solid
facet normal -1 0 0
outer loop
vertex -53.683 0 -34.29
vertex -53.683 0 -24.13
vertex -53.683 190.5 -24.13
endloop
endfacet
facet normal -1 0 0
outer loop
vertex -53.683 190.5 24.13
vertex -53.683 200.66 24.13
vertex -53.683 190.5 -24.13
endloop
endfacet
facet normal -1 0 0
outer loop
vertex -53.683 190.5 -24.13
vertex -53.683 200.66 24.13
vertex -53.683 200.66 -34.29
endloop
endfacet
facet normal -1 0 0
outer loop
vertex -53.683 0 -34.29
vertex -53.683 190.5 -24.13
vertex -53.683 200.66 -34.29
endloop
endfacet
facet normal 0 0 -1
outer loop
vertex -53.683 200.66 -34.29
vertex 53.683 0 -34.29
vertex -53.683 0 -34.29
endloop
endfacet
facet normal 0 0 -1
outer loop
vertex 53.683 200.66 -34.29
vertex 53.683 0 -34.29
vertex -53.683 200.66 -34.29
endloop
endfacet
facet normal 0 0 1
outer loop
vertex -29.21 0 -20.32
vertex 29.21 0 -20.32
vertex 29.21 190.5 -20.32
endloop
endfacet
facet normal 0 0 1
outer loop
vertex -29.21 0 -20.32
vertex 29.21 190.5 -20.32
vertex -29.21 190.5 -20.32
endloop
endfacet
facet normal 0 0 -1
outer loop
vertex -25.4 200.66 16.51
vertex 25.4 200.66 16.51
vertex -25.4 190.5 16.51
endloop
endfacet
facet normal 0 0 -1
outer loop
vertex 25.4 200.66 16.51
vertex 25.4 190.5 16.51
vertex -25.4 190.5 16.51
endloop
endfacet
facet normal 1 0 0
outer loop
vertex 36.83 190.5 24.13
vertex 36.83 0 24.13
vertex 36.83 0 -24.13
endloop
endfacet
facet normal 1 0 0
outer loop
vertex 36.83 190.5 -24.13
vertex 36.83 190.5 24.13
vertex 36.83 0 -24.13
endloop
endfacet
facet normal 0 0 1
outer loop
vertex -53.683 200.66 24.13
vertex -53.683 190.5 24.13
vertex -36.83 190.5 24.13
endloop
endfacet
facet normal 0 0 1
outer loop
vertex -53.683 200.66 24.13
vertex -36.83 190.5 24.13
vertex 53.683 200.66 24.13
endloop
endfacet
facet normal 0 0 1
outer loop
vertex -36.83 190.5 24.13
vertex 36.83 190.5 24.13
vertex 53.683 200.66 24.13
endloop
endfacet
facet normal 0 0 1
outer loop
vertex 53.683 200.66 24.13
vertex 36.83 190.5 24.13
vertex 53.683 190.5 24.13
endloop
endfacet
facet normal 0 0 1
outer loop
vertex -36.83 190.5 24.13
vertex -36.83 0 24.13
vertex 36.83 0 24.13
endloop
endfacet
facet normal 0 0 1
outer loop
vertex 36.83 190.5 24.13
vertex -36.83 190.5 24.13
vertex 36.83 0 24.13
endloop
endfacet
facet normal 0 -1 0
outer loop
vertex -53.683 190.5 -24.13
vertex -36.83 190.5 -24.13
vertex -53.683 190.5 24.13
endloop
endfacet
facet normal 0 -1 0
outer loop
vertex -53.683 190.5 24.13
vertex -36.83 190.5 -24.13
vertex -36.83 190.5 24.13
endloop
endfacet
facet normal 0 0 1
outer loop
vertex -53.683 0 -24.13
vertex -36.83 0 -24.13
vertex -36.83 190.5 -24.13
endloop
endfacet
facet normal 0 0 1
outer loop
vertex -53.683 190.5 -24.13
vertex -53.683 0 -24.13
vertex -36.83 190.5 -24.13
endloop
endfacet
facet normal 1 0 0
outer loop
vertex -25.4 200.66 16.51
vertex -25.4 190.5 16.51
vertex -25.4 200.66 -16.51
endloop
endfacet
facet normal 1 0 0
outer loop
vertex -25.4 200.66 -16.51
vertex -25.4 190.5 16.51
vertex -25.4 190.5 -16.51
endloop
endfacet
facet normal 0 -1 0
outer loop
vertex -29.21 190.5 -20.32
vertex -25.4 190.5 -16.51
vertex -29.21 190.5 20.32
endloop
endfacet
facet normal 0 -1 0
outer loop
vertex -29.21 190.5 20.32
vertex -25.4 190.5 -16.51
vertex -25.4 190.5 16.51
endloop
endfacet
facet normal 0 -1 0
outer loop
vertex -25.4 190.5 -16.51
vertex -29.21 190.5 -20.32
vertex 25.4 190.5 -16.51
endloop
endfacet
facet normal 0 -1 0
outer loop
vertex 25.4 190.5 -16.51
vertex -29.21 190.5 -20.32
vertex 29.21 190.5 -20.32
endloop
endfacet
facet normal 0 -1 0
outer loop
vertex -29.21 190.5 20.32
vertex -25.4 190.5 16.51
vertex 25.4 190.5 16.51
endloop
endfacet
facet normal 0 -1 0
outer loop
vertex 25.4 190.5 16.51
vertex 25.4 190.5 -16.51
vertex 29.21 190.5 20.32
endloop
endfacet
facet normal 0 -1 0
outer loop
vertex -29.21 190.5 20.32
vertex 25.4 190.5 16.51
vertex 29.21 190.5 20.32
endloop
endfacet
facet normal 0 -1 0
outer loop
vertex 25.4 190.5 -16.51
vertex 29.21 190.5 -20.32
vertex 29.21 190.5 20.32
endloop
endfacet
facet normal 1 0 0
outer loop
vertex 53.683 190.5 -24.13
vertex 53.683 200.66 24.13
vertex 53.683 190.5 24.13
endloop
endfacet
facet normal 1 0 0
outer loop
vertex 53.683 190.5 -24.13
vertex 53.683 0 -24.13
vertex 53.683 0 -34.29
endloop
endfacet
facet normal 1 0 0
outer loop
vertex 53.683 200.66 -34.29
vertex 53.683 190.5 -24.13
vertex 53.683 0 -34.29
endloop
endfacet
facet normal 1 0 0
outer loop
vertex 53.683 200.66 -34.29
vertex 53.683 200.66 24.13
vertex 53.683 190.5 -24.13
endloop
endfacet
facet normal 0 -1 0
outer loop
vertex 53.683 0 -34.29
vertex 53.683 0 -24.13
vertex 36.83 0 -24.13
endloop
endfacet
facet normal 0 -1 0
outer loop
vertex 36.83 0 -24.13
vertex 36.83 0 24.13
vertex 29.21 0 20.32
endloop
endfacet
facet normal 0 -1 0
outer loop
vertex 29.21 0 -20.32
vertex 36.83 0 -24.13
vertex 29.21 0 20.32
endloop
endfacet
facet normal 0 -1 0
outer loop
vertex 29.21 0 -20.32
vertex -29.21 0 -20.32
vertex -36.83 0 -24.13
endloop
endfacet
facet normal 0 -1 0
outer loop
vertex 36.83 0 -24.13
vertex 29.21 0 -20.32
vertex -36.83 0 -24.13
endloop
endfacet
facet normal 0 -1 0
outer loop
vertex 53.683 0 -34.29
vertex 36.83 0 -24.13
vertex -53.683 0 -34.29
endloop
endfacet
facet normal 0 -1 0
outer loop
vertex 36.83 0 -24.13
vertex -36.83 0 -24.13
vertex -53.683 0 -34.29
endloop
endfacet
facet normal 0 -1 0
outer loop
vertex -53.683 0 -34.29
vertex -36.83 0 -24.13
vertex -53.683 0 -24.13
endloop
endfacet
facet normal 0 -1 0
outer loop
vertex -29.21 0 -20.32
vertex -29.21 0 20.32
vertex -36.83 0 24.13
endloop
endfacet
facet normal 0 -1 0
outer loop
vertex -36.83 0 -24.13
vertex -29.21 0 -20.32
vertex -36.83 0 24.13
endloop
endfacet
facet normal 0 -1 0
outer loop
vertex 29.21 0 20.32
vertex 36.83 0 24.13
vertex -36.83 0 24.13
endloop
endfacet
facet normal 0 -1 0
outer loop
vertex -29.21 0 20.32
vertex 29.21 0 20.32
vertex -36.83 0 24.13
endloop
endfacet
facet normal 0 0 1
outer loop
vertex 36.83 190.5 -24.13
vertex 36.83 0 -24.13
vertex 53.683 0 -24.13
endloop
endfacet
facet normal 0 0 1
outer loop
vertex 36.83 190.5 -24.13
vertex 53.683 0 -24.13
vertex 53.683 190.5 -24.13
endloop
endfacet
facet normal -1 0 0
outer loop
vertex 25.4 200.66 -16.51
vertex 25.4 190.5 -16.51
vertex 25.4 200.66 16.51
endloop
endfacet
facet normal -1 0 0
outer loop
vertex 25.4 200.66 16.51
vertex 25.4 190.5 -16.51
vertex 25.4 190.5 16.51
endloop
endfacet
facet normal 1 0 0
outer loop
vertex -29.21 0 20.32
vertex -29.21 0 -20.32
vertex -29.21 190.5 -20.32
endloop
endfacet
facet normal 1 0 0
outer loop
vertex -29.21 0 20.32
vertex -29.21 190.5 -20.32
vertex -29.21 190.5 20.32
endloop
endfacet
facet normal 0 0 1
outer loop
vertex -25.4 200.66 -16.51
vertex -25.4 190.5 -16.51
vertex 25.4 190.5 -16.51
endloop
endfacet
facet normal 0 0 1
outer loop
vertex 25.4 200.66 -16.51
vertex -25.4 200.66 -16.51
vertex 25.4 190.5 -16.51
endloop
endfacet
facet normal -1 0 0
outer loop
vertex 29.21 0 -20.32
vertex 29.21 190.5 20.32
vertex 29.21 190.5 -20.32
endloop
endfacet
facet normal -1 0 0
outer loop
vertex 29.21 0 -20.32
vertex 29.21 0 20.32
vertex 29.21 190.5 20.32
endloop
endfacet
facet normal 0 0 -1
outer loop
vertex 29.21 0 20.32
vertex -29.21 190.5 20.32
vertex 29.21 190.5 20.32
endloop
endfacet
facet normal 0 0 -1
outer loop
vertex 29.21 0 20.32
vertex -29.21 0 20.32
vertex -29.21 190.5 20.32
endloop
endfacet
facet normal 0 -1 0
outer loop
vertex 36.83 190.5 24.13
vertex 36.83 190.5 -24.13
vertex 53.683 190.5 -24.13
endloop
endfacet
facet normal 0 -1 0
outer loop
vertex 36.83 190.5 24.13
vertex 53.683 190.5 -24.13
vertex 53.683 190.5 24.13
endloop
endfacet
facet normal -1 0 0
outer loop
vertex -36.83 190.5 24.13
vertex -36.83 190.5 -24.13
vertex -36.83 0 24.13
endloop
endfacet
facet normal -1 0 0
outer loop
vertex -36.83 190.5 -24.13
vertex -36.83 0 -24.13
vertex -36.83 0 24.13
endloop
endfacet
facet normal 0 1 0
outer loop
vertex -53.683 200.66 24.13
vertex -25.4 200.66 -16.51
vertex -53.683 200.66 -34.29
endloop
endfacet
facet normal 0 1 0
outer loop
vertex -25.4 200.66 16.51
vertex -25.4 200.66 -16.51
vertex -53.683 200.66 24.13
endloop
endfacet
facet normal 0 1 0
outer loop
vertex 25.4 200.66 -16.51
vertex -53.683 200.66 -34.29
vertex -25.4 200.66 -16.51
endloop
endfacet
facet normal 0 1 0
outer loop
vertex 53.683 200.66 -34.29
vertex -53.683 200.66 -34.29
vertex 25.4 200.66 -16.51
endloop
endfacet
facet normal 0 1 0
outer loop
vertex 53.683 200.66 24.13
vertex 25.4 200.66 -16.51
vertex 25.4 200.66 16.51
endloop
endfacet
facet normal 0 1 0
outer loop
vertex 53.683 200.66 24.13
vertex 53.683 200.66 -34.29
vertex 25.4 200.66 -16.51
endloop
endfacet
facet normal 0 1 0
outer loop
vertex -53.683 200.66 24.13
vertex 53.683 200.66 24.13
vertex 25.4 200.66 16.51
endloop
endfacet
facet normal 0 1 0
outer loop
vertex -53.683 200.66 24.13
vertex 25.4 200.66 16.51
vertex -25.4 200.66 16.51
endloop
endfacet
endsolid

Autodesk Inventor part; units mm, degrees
ref_plane "YZ Plane" through (0, 0, 0) normal (1, 0, 0) x (0, 1, 0)
ref_plane "XZ Plane" through (0, 0, 0) normal (0, 1, 0) x (-1, 0, 0)
ref_plane "XY Plane" through (0, 0, 0) normal (0, 0, 1) x (1, 0, 0)
sketch "Sketch1" plane through (0, 0, 0) normal (0, 1, 0) x (-1, 0, 0)
  line L0 (36.83, 24.13) -> (-36.83, 24.13)
  line L1 (-36.83, 24.13) -> (-36.83, -24.13)
  line L2 (-36.83, -24.13) -> (36.83, -24.13)
  line L3 (36.83, -24.13) -> (36.83, 24.13)
  line L4 (36.83, 24.13) -> (-36.83, -24.13) construction
  line L5 (-36.83, 24.13) -> (36.83, -24.13) construction
  line L6 (29.21, 20.32) -> (-29.21, 20.32)
  line L7 (-29.21, 20.32) -> (-29.21, -20.32)
  line L8 (-29.21, -20.32) -> (29.21, -20.32)
  line L9 (29.21, -20.32) -> (29.21, 20.32)
  line L10 (29.21, 20.32) -> (-29.21, -20.32) construction
  line L11 (-29.21, 20.32) -> (29.21, -20.32) construction
  point P0 (0, 0)
  dimension "d0" = 73.66
  dimension "d1" = 48.26
  dimension "d2" = 58.42
  dimension "d3" = 40.64
extrude "Extrusion1" add sketch "Sketch1" along normal blind 190.5
sketch "Sketch2" plane through (36.83, 0, 24.13) normal (1, 0, 0) x (0, 0, -1)
  line L0 (0, 0) -> (-10.16, 0)
  line L1 (48.26, 0) -> (48.26, 190.5) projected
  line L2 (48.26, 0) -> (58.42, 0)
  line L3 (-10.16, 0) -> (58.42, 0)
  line L4 (58.42, 0) -> (58.42, 190.5)
  line L5 (58.42, 190.5) -> (-10.16, 190.5)
  line L6 (-10.16, 190.5) -> (-10.16, 0)
  line L7 (-10.16, 190.5) -> (58.42, 190.5)
  line L8 (58.42, 190.5) -> (58.42, 200.66)
  line L9 (58.42, 200.66) -> (-10.16, 200.66)
  line L10 (-10.16, 200.66) -> (-10.16, 190.5)
  line L11 (0, 190.5) -> (48.26, 190.5) projected
  line L12 (-10.16, 0) -> (0, 0)
  line L13 (0, 0) -> (0, 190.5)
  line L14 (0, 190.5) -> (-10.16, 190.5)
  line L15 (-10.16, 190.5) -> (-10.16, 0)
  line L16 (0, 190.5) -> (58.42, 190.5)
  line L17 (58.42, 190.5) -> (58.42, 200.66)
  line L18 (58.42, 200.66) -> (0, 200.66)
  line L19 (0, 200.66) -> (0, 190.5)
  point P0 (24.13, 0)
  dimension "d6" = 10.16
  dimension "d7" = 10.16
  dimension "d8" = 10.16
extrude "Extrusion2" add sketch "Sketch2" against normal blind 90.5129 contours L1 L5 L4 L2 | L19 L9 L8 L5
extrude "Extrusion3" add sketch "Sketch2" along normal blind 16.8529 contours L1 L5 L4 L2 | L19 L9 L8 L5
sketch "Sketch3" plane through (-29.21, 190.5, 20.32) normal (0, -1, 0) x (1, 0, 0)
  line L0 (58.42, 0) -> (0, 0) projected
  line L1 (0, -40.64) -> (58.42, -40.64) projected
  line L2 (58.42, 0) -> (0, 0)
  line L3 (0, 0) -> (0, -40.64)
  line L4 (0, -40.64) -> (58.42, -40.64)
  line L5 (58.42, -40.64) -> (58.42, 0)
  line L6 (54.61, -3.81) -> (3.81, -3.81)
  line L7 (3.81, -3.81) -> (3.81, -36.83)
  line L8 (3.81, -36.83) -> (54.61, -36.83)
  line L9 (54.61, -36.83) -> (54.61, -3.81)
  line L10 (54.61, -3.81) -> (3.81, -36.83) construction
  line L11 (3.81, -3.81) -> (54.61, -36.83) construction
  point P0 (29.21, -20.32)
  dimension "d13" = 50.8
  dimension "d14" = 33.02
extrude "Extrusion4" cut sketch "Sketch3" against normal blind 10.16 contours L9 L8 L7 L6
properties part number "UE306_Sleeve"
